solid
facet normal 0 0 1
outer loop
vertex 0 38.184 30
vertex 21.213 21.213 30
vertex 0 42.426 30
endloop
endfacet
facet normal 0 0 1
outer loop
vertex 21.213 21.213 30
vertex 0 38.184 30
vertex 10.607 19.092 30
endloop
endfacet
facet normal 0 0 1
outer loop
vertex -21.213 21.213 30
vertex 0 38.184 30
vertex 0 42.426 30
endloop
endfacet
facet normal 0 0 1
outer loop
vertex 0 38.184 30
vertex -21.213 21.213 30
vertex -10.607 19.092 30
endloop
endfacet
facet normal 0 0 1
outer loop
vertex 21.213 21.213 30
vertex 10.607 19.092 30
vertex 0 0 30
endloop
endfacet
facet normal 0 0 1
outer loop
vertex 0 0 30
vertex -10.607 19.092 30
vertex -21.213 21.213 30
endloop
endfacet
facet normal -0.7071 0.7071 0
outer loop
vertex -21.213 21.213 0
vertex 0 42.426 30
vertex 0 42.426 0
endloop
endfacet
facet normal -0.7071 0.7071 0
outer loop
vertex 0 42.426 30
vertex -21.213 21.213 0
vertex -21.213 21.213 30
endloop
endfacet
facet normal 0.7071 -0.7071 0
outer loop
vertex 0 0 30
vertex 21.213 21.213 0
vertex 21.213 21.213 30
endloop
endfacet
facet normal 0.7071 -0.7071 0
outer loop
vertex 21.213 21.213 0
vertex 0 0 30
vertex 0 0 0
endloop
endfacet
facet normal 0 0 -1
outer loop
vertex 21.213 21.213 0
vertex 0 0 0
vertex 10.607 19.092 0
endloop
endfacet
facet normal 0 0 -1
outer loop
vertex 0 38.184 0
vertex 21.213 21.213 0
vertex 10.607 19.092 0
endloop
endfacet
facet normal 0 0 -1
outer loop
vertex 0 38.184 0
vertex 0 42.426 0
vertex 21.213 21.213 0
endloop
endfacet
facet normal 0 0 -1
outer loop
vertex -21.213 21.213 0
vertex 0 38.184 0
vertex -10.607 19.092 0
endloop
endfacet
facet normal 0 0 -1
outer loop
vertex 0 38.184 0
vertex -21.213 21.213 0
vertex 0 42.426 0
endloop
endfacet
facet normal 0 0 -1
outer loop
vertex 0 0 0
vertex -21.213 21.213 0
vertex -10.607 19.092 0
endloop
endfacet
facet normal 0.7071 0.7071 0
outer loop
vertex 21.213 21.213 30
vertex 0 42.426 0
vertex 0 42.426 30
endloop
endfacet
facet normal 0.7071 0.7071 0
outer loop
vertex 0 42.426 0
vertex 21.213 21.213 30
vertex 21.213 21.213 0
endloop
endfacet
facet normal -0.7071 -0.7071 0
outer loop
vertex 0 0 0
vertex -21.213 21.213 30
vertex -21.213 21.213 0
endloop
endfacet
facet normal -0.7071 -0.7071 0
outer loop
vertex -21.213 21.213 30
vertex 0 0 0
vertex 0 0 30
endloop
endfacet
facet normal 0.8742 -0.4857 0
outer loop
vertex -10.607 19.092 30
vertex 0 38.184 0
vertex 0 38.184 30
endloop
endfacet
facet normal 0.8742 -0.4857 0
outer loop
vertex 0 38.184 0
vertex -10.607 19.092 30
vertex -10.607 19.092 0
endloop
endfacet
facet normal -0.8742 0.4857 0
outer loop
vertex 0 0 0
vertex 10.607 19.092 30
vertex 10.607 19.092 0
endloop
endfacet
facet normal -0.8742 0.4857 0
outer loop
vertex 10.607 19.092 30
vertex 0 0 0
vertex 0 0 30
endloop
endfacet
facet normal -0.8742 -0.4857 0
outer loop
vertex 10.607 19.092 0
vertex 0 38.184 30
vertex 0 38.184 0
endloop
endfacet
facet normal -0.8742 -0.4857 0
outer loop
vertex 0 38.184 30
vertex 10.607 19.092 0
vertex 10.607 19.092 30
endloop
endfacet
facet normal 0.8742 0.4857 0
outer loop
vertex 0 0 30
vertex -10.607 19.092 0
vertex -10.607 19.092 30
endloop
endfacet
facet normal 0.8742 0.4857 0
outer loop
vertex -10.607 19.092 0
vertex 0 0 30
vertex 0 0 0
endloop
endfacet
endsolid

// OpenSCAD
rotate([0,-90,0]){
    difference(){
        rotate([-45,0,0]) {
            cube([30, 30, 30]);
        }
        scale([1,0.9,0.5]) {
            rotate([-45,0,0]) {
                cube([30, 30, 30]);
            }
        }
    }
}
